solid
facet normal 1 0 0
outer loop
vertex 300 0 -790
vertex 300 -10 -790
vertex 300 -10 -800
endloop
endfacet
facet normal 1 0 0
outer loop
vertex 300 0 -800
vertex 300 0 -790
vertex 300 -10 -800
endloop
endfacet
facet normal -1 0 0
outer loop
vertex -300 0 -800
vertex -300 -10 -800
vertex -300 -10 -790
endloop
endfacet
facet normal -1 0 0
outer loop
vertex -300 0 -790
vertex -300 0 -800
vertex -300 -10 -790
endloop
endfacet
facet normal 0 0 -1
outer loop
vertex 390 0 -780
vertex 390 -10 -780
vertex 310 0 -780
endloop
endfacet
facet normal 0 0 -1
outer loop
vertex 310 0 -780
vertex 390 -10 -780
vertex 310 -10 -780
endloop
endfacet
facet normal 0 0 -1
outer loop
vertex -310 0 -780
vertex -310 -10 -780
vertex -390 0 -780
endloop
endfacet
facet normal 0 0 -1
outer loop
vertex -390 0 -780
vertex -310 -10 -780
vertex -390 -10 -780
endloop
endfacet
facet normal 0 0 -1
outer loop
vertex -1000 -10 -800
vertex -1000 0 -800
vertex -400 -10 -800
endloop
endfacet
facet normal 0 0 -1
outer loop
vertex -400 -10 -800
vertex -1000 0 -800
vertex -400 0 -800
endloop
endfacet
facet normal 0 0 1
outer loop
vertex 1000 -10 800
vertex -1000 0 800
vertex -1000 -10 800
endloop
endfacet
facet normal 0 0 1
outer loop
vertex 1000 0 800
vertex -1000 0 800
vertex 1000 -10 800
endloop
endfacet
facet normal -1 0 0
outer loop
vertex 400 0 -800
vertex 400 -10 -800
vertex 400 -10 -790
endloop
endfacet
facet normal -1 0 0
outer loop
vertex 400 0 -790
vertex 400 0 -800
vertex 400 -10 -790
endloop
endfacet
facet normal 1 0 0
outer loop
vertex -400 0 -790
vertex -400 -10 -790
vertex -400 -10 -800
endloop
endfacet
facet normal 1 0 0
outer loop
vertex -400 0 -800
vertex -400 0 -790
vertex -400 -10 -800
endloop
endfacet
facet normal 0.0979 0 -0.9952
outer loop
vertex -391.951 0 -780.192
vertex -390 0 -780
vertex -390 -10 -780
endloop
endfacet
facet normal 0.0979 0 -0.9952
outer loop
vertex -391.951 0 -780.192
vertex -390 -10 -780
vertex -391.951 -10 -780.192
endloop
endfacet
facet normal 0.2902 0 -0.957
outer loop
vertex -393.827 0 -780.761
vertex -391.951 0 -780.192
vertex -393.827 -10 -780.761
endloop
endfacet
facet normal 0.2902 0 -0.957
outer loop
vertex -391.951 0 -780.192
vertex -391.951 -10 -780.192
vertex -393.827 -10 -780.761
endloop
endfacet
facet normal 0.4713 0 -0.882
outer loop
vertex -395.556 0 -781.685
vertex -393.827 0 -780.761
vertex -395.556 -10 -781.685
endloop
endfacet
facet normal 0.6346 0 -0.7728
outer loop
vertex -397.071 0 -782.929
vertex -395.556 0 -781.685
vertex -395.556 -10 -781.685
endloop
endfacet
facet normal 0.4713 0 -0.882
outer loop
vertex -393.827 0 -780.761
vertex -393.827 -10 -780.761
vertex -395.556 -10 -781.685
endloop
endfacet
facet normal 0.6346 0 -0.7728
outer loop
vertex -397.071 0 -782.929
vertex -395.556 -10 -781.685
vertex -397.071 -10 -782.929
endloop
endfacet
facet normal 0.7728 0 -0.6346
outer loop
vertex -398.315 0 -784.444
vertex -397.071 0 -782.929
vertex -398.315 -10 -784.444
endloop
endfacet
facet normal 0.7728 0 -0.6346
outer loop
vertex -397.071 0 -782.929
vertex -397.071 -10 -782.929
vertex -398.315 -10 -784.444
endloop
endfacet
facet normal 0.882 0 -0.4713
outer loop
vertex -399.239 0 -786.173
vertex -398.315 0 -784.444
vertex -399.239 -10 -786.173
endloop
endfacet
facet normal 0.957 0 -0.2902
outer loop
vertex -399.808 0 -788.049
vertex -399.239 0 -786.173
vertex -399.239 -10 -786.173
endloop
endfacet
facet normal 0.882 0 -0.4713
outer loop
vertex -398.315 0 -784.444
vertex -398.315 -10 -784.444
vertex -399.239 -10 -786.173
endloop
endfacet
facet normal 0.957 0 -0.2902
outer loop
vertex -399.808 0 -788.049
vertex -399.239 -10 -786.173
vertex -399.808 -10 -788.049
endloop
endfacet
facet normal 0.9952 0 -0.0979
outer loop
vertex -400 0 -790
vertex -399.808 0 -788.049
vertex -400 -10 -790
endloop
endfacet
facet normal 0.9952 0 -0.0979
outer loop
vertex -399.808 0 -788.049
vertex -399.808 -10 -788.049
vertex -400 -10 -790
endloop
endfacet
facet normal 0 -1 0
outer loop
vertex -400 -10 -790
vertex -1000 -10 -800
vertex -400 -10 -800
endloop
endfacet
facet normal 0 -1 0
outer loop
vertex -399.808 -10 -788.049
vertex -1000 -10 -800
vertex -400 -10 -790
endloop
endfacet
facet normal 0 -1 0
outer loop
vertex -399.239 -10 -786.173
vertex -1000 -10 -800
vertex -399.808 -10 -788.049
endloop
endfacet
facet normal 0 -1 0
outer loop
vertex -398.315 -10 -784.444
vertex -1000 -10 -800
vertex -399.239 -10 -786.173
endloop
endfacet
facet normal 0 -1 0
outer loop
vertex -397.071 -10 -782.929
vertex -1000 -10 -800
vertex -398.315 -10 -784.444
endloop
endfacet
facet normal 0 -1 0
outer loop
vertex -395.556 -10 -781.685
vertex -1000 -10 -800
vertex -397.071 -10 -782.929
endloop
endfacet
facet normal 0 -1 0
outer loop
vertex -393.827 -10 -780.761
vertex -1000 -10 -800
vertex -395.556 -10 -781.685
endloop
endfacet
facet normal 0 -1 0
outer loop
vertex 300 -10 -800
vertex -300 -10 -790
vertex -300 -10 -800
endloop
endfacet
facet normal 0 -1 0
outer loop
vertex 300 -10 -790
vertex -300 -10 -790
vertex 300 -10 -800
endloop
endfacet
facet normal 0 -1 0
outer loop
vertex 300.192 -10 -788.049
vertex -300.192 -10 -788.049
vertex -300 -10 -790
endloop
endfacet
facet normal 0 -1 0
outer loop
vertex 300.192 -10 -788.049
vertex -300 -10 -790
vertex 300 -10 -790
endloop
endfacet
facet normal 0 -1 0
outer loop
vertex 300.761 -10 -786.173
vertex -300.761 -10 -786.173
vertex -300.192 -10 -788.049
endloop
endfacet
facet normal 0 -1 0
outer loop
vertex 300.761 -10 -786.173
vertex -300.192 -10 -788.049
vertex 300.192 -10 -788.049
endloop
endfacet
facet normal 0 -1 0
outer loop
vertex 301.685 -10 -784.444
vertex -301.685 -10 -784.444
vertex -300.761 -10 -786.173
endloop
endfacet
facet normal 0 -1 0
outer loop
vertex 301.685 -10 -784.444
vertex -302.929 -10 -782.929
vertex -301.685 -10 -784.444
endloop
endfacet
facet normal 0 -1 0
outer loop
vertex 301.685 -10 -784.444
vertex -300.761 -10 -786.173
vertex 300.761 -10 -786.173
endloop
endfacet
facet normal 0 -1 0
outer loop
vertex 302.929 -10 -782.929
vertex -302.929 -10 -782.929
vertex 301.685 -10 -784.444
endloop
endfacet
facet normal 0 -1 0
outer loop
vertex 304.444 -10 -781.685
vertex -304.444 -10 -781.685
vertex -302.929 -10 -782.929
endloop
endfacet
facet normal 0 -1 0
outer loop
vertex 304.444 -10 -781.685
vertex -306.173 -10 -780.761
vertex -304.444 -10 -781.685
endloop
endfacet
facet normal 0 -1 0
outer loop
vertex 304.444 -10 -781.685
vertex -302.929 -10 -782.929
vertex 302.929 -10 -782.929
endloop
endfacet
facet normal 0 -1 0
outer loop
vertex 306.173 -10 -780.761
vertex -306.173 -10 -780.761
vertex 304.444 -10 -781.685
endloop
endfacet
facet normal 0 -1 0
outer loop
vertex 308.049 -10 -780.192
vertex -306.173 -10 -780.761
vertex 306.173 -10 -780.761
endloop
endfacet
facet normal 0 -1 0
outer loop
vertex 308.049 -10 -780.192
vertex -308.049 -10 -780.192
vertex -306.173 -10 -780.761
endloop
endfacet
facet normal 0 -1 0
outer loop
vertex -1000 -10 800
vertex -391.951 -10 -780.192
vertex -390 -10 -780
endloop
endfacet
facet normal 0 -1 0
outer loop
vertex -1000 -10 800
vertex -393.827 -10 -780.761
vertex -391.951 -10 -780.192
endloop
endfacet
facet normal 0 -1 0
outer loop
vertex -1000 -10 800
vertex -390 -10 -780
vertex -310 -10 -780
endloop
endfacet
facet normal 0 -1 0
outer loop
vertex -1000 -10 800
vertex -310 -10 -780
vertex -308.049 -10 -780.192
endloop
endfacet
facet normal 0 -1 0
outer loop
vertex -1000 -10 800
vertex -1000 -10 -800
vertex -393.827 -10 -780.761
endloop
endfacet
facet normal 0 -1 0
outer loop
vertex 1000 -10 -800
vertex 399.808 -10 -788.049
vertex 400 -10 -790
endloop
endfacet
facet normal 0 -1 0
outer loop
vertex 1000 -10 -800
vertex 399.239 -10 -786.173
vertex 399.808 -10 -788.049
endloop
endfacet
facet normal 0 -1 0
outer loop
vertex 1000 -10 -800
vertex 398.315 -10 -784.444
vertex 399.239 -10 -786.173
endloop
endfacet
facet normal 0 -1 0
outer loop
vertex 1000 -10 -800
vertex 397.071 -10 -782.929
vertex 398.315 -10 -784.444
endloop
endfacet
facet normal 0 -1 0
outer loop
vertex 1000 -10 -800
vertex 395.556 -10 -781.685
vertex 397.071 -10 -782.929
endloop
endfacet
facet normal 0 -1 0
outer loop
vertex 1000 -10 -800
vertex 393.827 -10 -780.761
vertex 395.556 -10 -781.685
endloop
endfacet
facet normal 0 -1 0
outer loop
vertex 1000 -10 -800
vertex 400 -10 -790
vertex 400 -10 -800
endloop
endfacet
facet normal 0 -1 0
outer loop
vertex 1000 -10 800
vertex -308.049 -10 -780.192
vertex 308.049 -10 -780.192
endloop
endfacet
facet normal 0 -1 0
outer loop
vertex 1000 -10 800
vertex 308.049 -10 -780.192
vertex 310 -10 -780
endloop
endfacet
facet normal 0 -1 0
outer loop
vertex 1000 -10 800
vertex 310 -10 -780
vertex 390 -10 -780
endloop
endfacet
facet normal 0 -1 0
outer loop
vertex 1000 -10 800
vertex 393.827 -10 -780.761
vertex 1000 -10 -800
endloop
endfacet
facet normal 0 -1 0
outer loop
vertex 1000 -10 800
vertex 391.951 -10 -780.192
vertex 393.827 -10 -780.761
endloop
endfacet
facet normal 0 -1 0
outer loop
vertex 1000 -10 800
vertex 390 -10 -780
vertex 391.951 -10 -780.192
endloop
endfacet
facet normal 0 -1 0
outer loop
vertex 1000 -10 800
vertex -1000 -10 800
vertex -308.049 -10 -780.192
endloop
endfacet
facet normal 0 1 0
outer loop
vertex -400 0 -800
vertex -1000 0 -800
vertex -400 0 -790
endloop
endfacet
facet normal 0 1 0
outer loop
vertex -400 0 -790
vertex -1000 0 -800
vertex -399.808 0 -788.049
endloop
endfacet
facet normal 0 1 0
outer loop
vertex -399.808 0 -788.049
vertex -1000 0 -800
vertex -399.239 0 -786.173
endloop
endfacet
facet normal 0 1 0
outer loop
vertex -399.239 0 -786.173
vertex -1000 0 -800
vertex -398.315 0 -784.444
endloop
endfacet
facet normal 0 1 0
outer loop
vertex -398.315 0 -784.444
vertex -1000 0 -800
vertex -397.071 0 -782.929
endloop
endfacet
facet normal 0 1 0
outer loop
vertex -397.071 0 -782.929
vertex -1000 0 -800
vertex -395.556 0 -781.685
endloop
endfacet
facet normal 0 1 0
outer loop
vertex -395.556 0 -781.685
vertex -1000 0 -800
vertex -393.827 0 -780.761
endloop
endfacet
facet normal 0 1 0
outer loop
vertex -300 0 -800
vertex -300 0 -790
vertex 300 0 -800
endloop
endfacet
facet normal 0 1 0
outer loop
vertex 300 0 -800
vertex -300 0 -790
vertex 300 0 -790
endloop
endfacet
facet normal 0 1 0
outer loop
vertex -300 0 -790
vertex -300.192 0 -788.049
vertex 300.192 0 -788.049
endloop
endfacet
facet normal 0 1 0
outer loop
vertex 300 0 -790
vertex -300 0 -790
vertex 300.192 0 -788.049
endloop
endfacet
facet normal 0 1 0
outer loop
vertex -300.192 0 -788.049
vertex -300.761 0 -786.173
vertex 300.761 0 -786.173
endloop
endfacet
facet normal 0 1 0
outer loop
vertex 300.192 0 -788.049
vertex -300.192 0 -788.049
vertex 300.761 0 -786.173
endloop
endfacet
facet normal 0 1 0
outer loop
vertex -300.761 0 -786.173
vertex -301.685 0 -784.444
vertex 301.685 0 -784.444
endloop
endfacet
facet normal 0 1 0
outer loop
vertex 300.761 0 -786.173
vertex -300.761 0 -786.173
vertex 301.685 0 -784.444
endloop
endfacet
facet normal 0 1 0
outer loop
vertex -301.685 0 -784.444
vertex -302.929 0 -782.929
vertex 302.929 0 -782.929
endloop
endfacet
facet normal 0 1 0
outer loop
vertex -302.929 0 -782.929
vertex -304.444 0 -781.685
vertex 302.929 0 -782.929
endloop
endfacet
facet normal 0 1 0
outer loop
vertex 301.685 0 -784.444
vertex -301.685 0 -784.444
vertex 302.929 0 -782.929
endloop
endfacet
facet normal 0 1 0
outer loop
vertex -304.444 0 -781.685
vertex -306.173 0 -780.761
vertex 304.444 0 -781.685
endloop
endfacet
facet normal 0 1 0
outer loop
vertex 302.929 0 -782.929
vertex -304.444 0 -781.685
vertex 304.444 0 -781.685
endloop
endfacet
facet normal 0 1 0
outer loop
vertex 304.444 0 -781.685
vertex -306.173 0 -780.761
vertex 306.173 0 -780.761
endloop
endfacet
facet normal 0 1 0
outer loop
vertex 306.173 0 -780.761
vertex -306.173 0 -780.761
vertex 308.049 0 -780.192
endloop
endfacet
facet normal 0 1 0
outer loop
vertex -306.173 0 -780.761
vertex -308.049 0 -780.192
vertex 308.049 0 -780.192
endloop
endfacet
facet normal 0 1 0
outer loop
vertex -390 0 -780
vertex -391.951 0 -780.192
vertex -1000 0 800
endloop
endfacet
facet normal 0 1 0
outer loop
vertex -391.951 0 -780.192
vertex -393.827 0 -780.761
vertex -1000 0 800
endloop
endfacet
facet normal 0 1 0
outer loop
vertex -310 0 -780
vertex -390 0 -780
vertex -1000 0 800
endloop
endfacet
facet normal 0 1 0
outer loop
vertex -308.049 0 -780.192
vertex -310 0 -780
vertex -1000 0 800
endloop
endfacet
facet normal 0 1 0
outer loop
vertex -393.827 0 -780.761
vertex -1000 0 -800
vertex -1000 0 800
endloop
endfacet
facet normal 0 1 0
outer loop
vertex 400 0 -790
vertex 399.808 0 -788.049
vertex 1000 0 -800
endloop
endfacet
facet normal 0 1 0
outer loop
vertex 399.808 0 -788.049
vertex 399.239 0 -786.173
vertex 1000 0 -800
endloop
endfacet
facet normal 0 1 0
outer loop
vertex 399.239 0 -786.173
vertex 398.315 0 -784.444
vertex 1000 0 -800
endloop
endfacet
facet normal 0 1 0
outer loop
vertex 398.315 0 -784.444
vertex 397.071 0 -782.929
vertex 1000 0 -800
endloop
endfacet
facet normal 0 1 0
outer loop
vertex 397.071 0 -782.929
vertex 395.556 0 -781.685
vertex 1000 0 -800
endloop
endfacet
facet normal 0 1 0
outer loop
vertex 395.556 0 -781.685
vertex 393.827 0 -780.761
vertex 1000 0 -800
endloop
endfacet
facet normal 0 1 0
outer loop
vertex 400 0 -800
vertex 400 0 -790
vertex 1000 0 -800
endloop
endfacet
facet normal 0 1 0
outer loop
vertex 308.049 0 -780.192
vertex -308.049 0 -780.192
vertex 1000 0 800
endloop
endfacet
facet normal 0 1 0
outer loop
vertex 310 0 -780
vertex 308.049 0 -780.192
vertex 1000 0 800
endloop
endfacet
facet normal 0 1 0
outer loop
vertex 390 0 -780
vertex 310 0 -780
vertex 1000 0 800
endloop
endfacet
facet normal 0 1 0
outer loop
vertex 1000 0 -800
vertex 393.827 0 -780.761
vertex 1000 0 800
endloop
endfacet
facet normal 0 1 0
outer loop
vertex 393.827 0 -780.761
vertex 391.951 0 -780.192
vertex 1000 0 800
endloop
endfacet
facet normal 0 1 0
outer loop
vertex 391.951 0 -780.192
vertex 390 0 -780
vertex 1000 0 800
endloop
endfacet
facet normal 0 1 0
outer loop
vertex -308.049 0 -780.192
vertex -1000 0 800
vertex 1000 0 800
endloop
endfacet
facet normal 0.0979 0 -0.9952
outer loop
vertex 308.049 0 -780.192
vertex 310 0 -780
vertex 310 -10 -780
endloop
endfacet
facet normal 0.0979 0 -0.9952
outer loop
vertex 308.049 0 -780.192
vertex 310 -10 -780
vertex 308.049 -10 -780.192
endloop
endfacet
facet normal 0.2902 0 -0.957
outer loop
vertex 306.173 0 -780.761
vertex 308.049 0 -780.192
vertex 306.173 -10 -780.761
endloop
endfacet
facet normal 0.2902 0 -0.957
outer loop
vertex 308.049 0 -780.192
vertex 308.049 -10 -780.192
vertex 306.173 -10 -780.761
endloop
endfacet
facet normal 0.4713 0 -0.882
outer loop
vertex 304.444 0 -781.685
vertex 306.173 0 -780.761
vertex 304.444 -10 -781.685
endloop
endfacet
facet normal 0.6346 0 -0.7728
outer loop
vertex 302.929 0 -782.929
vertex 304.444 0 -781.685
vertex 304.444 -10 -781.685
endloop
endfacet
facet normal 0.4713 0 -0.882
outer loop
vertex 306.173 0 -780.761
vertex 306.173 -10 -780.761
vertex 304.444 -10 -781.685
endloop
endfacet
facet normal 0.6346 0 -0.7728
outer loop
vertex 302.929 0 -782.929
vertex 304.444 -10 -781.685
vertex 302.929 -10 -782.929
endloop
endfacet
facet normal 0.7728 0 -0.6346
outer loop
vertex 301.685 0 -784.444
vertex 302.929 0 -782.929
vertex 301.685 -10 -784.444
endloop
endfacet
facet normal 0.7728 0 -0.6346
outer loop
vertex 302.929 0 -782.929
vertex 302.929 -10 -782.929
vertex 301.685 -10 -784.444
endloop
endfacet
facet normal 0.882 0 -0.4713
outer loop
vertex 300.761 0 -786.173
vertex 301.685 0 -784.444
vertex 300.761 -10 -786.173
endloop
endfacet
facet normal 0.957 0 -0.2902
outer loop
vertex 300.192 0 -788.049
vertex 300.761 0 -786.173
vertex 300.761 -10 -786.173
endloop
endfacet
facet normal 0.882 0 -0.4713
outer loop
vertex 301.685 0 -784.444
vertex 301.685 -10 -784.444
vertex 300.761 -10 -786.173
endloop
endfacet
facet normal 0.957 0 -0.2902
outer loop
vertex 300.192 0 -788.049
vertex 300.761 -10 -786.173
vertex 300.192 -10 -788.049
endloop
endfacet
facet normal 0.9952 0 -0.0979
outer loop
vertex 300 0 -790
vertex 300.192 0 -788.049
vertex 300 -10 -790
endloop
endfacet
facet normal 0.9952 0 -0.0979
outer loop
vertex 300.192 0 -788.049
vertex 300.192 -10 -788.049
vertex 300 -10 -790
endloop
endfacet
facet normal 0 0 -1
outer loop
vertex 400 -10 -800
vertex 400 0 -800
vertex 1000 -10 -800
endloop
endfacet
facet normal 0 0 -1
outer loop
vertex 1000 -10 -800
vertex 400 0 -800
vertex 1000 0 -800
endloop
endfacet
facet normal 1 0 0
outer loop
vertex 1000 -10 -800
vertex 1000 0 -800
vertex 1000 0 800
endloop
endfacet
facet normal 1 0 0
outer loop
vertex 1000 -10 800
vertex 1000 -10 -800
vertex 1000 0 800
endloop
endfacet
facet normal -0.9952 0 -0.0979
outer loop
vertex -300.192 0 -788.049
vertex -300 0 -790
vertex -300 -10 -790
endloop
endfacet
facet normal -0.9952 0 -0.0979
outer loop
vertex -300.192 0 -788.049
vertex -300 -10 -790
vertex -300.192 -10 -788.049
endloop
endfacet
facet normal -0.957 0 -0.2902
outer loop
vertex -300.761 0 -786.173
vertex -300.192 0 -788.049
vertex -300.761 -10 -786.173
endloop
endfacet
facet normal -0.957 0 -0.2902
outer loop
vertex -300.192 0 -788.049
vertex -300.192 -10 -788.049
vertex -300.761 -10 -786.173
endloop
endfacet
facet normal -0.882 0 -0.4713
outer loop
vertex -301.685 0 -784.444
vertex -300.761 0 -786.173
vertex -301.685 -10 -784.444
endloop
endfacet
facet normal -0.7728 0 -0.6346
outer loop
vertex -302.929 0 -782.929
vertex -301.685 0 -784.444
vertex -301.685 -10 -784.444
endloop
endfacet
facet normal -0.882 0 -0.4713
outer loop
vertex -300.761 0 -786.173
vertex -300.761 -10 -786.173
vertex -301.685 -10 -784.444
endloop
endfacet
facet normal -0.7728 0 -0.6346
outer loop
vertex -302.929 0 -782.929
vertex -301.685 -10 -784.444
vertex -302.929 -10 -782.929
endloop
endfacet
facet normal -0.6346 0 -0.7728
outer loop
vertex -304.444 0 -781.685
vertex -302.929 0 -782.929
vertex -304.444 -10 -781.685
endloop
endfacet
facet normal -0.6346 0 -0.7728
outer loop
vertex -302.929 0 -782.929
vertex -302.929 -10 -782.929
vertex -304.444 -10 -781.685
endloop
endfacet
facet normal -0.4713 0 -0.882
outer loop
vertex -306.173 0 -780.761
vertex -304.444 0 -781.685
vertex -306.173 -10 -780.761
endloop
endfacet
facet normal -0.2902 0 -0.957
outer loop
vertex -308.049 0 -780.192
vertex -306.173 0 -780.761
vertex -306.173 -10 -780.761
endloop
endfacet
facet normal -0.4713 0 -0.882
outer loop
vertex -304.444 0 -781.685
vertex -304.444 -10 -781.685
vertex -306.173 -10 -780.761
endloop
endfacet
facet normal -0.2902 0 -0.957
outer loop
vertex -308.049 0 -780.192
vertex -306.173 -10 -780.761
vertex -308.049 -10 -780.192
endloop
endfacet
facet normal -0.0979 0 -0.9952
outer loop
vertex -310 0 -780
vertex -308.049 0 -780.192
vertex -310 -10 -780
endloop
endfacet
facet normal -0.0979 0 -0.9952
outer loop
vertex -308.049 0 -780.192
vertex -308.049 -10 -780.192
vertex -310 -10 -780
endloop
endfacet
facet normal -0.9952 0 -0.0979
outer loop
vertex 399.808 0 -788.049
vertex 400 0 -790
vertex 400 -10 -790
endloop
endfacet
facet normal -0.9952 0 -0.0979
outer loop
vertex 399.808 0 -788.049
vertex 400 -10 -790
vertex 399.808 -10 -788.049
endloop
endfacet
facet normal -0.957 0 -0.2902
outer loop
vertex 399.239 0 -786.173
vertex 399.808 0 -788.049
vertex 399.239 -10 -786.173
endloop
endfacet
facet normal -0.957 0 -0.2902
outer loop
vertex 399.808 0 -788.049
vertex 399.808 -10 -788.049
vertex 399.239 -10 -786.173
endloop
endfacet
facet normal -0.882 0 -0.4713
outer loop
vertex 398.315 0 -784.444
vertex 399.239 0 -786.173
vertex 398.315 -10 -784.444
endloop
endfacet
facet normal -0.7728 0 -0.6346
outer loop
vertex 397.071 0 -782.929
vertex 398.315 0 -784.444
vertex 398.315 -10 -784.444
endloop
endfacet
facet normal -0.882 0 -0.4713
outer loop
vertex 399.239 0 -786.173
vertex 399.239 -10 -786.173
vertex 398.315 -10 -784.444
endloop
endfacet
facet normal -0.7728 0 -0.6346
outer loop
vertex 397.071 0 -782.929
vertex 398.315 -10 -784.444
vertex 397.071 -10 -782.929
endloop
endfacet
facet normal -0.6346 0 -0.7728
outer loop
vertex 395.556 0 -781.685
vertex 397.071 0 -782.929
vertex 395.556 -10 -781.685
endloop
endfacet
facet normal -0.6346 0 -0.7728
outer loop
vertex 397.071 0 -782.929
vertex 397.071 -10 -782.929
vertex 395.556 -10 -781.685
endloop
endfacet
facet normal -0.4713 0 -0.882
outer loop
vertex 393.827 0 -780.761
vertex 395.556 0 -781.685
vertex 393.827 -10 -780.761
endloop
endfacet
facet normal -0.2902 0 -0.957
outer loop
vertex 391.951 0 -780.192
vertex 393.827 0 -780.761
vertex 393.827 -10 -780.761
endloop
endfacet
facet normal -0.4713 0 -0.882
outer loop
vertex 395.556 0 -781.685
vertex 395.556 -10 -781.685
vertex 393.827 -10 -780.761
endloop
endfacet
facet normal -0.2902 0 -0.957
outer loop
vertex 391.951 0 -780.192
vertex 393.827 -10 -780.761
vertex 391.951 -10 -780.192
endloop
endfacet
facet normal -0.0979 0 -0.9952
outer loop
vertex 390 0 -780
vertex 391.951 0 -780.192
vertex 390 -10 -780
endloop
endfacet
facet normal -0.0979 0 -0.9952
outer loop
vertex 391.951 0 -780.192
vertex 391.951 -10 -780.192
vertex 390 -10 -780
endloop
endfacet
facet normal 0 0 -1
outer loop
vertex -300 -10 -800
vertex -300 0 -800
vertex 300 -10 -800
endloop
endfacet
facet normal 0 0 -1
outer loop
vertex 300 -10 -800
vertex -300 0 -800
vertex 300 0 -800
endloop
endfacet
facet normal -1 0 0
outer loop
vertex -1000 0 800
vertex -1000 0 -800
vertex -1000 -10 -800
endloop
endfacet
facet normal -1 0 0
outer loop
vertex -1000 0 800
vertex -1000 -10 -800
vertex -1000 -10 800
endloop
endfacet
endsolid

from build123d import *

# Parameters (mm, degrees)
F0_W     = 2000
F0_H     = 1600
F1_DEPTH = 10
F3_DEPTH = 18


with BuildPart() as f1:
    # F0 (on Front) → F1 (new body)
    with BuildSketch(Plane.XZ):
        Rectangle(F0_W, F0_H)
    extrude(amount=F1_DEPTH)

    # F2 (on face) → F3 (cut)
    with BuildSketch(Plane.XZ.offset(10)):
        with BuildLine():
            Line((-400, -790), (-400, -800))
            Line((-400, -800), (-300, -800))
            Line((-300, -800), (-300, -790))
            ThreePointArc((-300, -790), (-302.928932, -782.928932), (-310, -780))
            Line((-310, -780), (-390, -780))
            ThreePointArc((-390, -780), (-397.071068, -782.928932), (-400, -790))
        make_face()
        with BuildLine():
            Line((300, -790), (300, -800))
            Line((300, -800), (400, -800))
            Line((400, -800), (400, -790))
            ThreePointArc((400, -790), (397.071068, -782.928932), (390, -780))
            Line((390, -780), (310, -780))
            ThreePointArc((310, -780), (302.928932, -782.928932), (300, -790))
        make_face()
    extrude(amount=-F3_DEPTH, mode=Mode.SUBTRACT)


solid = f1.part
